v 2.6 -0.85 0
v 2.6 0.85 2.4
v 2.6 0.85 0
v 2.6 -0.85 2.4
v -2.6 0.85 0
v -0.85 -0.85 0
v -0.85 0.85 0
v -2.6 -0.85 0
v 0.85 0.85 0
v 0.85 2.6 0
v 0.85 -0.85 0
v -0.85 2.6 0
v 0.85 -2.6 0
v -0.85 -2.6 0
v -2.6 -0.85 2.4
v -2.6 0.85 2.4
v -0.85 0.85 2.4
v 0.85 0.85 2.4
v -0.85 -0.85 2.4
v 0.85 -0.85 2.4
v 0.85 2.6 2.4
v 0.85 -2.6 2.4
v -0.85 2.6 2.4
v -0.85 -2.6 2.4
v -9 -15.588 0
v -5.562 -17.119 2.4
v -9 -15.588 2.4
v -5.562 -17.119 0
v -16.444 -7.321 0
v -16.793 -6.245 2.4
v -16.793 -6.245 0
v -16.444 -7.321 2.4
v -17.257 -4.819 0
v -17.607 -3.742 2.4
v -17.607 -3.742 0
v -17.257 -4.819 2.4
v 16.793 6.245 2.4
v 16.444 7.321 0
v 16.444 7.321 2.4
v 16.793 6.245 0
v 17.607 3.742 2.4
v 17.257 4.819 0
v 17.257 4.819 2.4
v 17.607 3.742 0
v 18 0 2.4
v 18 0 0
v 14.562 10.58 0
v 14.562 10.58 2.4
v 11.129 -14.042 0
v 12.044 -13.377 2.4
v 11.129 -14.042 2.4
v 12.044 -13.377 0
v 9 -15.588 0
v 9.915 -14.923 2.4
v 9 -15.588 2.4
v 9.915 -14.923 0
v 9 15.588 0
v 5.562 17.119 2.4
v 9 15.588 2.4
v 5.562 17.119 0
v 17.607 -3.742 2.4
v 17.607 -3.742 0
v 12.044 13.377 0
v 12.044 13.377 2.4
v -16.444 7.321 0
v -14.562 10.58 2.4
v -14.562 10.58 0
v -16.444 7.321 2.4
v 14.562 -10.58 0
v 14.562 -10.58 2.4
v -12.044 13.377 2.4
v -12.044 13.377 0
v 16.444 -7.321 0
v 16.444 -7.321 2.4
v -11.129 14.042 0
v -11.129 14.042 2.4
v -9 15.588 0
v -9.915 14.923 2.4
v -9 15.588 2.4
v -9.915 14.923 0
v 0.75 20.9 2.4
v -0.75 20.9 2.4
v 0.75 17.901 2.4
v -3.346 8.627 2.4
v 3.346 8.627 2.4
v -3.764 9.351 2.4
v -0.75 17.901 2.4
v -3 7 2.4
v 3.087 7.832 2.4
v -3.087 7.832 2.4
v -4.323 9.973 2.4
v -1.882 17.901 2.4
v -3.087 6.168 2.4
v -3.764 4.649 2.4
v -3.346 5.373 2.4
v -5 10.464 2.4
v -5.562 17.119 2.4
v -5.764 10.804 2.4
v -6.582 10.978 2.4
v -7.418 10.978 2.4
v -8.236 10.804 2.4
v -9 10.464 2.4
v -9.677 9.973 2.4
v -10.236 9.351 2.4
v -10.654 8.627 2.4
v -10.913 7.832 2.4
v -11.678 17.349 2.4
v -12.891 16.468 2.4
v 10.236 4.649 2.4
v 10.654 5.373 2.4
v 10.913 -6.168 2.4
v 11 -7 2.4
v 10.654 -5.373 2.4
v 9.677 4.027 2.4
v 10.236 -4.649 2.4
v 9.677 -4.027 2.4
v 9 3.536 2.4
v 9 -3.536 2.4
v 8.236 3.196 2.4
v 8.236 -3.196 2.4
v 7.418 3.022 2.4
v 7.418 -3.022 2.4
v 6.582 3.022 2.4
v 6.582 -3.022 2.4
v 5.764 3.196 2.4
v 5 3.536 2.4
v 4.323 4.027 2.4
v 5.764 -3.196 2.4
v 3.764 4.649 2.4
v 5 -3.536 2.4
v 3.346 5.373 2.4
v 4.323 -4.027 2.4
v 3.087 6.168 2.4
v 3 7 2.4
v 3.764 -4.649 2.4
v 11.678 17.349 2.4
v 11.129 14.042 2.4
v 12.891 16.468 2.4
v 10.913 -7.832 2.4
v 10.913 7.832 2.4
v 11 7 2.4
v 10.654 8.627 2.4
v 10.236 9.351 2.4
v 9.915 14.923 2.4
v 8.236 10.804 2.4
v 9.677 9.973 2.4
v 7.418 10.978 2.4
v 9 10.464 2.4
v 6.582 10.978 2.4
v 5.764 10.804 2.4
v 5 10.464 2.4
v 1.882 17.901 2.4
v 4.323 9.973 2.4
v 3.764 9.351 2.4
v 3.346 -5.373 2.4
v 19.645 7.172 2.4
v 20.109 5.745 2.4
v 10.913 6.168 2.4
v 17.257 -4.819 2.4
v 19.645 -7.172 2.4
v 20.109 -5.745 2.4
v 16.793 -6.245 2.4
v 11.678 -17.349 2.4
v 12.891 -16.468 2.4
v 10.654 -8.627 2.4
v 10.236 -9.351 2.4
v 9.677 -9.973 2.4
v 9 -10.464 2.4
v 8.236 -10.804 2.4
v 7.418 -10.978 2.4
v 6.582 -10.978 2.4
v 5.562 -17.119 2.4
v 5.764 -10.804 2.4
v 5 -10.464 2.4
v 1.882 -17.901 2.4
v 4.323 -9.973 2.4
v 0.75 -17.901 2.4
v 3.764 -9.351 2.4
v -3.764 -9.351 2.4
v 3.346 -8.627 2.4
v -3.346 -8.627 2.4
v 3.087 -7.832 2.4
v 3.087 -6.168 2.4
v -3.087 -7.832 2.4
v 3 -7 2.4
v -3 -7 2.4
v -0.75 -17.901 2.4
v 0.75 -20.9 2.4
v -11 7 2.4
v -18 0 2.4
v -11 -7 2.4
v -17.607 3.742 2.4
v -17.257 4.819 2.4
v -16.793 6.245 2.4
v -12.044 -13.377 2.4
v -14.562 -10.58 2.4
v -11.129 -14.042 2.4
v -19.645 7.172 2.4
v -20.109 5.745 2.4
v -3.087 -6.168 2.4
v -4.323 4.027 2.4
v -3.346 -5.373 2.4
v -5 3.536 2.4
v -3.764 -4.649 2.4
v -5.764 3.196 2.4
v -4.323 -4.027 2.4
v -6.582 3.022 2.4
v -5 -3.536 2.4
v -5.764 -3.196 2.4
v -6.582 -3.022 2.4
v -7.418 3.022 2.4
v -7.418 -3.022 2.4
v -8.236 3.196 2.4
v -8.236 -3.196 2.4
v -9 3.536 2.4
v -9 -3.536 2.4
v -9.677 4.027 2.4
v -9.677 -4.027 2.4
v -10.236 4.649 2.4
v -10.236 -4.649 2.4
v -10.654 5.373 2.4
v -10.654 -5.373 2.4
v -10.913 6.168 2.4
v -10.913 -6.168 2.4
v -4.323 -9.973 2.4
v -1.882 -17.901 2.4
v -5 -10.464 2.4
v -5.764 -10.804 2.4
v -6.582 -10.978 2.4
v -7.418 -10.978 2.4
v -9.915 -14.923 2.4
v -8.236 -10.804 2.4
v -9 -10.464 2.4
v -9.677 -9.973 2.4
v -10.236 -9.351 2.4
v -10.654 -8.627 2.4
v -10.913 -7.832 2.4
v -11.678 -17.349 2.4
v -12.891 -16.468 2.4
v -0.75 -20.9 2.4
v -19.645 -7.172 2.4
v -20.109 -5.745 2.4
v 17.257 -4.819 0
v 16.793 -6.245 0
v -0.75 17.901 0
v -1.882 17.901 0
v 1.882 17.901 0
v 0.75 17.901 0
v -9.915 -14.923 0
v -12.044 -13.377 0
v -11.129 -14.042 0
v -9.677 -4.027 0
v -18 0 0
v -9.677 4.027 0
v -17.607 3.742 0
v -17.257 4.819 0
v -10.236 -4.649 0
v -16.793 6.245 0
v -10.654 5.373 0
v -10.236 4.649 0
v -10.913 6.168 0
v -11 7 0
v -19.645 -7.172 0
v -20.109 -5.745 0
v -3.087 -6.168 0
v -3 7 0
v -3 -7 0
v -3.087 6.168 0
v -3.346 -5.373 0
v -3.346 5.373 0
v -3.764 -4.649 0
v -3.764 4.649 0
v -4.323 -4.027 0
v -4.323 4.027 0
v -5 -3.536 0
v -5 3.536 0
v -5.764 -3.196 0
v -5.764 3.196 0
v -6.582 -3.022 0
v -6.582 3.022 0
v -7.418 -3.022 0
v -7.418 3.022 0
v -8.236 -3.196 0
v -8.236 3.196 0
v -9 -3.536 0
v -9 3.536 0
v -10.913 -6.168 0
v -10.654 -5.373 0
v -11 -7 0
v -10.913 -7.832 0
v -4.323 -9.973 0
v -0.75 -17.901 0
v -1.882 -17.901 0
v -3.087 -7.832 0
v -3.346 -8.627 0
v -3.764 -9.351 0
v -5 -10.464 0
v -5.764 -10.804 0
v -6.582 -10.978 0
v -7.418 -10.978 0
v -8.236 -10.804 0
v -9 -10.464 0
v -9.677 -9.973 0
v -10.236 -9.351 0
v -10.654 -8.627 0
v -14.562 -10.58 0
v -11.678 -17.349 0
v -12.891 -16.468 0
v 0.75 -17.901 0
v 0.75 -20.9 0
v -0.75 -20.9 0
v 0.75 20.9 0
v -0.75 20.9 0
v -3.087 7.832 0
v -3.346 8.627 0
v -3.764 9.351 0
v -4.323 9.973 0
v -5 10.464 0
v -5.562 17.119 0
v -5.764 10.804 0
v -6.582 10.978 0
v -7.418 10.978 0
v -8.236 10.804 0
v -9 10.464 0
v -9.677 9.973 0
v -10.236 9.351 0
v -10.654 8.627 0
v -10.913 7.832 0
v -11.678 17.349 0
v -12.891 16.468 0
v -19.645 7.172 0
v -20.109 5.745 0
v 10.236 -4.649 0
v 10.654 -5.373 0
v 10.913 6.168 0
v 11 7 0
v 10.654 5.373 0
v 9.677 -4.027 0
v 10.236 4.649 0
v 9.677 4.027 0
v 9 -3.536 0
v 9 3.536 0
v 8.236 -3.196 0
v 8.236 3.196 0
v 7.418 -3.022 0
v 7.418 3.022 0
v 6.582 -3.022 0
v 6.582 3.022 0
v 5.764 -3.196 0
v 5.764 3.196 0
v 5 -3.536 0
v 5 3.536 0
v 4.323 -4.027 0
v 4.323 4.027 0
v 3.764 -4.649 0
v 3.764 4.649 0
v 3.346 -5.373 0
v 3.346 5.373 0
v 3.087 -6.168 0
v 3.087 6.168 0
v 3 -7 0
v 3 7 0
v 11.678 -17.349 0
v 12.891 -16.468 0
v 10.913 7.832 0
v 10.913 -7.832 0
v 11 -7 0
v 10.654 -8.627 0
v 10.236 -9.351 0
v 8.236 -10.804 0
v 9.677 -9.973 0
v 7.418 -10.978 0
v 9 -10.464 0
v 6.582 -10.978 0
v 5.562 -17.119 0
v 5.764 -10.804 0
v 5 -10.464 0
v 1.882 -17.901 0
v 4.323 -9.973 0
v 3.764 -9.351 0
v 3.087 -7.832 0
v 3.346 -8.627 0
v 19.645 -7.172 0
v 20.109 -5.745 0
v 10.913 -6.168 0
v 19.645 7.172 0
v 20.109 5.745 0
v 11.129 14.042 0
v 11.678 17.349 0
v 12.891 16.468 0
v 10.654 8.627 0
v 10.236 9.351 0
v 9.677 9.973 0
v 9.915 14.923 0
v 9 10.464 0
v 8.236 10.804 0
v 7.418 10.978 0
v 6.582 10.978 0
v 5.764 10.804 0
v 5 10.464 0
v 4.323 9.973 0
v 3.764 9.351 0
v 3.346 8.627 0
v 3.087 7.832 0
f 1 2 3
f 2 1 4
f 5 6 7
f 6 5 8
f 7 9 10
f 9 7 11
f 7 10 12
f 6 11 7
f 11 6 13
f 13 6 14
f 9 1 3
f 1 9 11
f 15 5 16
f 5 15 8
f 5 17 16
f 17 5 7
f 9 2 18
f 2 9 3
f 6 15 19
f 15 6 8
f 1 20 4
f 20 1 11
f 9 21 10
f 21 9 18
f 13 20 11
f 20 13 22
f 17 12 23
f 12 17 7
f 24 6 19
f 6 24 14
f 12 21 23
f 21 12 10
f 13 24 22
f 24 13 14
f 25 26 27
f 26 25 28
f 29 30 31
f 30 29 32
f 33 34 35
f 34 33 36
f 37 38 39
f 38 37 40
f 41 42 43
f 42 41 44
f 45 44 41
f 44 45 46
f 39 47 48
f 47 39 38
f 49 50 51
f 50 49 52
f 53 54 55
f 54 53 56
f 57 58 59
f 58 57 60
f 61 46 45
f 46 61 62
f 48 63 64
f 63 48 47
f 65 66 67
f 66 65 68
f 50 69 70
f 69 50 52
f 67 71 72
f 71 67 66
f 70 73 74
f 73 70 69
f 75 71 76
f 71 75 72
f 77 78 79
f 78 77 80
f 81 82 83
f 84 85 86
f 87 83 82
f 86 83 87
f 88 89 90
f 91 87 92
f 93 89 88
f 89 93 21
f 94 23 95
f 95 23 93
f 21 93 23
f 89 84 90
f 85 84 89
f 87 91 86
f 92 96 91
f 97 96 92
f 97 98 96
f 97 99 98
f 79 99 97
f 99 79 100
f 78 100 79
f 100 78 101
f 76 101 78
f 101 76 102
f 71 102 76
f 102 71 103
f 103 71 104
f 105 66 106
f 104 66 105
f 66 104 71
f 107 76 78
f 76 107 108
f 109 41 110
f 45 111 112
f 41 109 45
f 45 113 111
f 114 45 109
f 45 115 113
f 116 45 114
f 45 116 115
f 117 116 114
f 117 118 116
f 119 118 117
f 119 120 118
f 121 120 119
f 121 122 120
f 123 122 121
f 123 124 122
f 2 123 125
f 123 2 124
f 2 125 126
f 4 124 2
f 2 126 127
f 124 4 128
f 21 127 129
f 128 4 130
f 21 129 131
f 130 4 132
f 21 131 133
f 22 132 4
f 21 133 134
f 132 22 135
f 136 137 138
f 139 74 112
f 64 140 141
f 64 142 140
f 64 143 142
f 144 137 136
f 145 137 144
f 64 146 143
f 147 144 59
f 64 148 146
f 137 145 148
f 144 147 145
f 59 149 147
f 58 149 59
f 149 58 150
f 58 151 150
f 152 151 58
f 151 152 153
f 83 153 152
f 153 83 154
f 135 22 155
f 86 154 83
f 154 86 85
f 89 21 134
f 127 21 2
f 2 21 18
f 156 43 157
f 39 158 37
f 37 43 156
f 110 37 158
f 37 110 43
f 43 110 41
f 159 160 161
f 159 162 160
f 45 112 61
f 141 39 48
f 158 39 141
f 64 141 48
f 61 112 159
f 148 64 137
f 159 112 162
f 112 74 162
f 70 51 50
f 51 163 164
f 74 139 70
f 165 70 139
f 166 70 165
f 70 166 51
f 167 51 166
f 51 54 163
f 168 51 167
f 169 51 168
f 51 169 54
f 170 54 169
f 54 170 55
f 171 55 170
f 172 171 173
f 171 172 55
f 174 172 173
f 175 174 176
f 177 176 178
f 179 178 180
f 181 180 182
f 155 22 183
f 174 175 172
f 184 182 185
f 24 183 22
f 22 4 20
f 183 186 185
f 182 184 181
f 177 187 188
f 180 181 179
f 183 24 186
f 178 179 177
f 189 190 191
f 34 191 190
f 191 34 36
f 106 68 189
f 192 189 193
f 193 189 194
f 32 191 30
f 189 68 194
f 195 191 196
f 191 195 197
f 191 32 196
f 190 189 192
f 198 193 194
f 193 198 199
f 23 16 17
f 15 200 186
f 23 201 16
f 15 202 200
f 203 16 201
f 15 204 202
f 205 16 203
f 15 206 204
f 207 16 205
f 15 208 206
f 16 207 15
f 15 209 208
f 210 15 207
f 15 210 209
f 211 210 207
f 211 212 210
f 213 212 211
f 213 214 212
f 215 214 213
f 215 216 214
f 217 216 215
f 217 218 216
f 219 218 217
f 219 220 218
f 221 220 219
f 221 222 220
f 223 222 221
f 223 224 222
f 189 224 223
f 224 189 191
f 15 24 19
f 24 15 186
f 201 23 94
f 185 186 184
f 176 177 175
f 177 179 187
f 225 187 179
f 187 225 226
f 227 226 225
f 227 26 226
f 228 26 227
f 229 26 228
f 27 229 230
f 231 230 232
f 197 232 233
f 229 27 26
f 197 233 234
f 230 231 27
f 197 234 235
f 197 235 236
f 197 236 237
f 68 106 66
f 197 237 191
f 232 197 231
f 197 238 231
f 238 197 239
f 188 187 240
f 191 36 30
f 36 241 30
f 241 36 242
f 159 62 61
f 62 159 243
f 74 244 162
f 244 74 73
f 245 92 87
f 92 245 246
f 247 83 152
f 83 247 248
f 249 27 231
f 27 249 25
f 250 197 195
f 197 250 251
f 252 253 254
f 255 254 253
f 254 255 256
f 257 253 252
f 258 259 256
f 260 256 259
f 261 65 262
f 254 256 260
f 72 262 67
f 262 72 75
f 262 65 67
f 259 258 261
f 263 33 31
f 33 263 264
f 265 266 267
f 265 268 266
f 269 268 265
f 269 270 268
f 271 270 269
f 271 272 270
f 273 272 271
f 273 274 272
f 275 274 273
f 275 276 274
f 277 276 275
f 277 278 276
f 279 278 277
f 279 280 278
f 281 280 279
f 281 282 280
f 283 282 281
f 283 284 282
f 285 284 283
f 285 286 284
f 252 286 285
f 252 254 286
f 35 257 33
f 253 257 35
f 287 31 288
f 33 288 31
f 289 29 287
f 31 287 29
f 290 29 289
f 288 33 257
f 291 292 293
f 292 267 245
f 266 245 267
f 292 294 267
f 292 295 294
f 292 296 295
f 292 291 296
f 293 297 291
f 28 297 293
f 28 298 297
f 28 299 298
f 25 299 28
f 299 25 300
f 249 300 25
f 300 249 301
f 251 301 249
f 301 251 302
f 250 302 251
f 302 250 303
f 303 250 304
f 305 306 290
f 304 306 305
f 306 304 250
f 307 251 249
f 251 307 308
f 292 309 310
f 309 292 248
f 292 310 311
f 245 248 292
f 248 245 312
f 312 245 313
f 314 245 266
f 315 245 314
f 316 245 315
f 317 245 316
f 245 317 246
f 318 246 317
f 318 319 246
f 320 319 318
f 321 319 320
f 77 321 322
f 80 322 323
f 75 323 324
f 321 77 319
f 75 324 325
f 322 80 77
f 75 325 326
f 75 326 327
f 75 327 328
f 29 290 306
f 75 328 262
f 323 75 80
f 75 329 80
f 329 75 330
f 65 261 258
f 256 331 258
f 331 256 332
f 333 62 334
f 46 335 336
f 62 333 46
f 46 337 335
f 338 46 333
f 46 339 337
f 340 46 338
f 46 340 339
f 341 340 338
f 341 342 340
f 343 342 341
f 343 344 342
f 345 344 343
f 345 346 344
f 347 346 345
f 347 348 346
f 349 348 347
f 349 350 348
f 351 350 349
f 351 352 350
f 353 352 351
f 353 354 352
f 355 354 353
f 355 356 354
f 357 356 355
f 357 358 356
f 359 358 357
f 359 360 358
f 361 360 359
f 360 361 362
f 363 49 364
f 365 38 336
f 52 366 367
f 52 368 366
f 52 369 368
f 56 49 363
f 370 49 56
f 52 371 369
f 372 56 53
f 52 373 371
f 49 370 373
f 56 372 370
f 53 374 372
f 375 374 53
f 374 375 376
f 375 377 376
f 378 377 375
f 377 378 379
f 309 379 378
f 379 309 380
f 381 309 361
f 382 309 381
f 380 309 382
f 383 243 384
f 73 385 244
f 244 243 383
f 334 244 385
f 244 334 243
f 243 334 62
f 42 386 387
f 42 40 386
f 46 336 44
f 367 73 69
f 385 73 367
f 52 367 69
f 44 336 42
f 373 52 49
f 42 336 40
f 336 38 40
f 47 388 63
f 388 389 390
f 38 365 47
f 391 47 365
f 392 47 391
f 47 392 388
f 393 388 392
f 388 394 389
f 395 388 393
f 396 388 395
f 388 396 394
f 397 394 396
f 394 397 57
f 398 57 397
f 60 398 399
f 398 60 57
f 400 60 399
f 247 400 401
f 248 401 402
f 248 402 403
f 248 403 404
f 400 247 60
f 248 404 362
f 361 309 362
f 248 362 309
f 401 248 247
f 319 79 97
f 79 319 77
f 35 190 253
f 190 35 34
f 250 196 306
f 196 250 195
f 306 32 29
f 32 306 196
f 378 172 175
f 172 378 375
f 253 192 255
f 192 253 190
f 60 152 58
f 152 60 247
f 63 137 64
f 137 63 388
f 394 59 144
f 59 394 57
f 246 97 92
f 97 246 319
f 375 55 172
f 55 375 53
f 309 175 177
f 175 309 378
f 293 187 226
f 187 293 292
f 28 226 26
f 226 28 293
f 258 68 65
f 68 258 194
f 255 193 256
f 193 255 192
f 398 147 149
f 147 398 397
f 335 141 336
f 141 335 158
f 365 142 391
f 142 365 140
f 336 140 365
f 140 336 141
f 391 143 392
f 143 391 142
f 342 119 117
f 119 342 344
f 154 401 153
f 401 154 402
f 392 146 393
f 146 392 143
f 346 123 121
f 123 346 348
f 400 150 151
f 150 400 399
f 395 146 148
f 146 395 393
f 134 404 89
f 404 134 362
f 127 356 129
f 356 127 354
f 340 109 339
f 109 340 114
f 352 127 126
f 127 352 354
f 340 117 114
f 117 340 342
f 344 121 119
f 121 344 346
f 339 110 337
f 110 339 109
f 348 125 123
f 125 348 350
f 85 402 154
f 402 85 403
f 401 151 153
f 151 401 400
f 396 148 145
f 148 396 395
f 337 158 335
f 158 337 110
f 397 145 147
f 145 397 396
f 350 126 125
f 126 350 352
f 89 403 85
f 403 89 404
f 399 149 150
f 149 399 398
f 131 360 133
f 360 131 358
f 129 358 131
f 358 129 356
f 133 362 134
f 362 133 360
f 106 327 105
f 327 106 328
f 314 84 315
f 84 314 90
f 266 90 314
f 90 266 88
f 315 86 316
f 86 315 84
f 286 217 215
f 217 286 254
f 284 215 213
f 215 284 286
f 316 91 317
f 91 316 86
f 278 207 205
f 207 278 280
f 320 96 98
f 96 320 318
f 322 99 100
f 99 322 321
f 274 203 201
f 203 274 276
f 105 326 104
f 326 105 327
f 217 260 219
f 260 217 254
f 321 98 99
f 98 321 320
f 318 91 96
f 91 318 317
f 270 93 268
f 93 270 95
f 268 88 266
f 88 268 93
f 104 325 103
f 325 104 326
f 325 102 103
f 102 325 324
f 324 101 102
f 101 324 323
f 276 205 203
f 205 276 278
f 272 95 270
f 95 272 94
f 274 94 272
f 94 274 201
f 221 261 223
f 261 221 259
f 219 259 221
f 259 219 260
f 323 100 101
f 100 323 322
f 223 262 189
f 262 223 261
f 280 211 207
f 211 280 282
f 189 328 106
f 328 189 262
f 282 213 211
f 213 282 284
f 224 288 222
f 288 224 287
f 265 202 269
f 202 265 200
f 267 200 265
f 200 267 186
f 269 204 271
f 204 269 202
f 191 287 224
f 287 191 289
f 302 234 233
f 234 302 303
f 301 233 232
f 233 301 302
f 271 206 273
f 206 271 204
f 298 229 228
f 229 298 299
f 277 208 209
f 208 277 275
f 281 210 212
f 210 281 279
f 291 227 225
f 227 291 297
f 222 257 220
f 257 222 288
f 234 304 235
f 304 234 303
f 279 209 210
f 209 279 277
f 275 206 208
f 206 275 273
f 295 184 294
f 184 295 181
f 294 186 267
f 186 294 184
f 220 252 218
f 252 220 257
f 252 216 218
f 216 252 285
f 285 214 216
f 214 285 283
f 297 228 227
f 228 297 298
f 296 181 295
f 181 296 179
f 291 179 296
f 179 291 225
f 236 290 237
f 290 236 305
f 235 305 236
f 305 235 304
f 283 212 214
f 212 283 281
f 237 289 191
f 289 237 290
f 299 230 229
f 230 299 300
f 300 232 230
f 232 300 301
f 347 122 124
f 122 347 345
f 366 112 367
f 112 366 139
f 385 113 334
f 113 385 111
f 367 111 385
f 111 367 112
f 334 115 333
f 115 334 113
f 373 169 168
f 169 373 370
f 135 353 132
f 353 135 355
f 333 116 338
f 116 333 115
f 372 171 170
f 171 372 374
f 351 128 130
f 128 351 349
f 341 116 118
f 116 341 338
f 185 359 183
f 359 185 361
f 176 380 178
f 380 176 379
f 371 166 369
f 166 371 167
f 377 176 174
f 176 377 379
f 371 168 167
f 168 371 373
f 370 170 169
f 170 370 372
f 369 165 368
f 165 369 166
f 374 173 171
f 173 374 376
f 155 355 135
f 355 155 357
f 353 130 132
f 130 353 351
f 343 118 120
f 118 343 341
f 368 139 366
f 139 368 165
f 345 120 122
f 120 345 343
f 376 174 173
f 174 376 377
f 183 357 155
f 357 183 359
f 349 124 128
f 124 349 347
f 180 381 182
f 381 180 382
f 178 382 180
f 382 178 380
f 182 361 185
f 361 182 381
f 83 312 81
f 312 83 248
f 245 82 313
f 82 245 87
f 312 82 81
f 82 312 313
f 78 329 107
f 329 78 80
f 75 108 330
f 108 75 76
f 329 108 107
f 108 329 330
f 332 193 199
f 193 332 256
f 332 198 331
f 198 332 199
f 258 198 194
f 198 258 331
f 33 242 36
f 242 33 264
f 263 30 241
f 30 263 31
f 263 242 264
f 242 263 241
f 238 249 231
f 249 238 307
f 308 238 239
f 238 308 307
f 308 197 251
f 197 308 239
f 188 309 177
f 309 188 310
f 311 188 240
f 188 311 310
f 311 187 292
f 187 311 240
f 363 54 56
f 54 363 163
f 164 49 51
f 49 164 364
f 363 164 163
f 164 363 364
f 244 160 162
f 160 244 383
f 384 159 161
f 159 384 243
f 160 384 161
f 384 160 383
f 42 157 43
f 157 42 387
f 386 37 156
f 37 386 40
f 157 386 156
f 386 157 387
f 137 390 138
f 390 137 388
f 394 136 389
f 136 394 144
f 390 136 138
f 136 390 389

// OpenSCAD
module paddle(angle)
{
  rotate([0,0,angle])
    translate(v=[-0.75,17.9,0])
      cube(size=[1.5,3,2.4]);
}

module legocross()
{
  cube(size=[5.2,1.7,2.4],center=true);
  cube(size=[1.7,5.2,2.4],center=true);
}

difference()
{
  cylinder(h=2.4,r=18,$fs=0.1);

  translate(v=[7,7,0])
    cylinder(h=2.4,r=4,$fs=0.1);  
  translate(v=[-7,7,0])
    cylinder(h=2.4,r=4,$fs=0.1);  
  translate(v=[-7,-7,0])
    cylinder(h=2.4,r=4,$fs=0.1);  
  translate(v=[7,-7,0])
    cylinder(h=2.4,r=4,$fs=0.1);  

  translate(v=[0,0,1.2])
    legocross();
}

paddle(0);
paddle(1*36);
paddle(2*36);
paddle(3*36);
paddle(4*36);
paddle(5*36);
paddle(6*36);
paddle(7*36);
paddle(8*36);
paddle(9*36);
